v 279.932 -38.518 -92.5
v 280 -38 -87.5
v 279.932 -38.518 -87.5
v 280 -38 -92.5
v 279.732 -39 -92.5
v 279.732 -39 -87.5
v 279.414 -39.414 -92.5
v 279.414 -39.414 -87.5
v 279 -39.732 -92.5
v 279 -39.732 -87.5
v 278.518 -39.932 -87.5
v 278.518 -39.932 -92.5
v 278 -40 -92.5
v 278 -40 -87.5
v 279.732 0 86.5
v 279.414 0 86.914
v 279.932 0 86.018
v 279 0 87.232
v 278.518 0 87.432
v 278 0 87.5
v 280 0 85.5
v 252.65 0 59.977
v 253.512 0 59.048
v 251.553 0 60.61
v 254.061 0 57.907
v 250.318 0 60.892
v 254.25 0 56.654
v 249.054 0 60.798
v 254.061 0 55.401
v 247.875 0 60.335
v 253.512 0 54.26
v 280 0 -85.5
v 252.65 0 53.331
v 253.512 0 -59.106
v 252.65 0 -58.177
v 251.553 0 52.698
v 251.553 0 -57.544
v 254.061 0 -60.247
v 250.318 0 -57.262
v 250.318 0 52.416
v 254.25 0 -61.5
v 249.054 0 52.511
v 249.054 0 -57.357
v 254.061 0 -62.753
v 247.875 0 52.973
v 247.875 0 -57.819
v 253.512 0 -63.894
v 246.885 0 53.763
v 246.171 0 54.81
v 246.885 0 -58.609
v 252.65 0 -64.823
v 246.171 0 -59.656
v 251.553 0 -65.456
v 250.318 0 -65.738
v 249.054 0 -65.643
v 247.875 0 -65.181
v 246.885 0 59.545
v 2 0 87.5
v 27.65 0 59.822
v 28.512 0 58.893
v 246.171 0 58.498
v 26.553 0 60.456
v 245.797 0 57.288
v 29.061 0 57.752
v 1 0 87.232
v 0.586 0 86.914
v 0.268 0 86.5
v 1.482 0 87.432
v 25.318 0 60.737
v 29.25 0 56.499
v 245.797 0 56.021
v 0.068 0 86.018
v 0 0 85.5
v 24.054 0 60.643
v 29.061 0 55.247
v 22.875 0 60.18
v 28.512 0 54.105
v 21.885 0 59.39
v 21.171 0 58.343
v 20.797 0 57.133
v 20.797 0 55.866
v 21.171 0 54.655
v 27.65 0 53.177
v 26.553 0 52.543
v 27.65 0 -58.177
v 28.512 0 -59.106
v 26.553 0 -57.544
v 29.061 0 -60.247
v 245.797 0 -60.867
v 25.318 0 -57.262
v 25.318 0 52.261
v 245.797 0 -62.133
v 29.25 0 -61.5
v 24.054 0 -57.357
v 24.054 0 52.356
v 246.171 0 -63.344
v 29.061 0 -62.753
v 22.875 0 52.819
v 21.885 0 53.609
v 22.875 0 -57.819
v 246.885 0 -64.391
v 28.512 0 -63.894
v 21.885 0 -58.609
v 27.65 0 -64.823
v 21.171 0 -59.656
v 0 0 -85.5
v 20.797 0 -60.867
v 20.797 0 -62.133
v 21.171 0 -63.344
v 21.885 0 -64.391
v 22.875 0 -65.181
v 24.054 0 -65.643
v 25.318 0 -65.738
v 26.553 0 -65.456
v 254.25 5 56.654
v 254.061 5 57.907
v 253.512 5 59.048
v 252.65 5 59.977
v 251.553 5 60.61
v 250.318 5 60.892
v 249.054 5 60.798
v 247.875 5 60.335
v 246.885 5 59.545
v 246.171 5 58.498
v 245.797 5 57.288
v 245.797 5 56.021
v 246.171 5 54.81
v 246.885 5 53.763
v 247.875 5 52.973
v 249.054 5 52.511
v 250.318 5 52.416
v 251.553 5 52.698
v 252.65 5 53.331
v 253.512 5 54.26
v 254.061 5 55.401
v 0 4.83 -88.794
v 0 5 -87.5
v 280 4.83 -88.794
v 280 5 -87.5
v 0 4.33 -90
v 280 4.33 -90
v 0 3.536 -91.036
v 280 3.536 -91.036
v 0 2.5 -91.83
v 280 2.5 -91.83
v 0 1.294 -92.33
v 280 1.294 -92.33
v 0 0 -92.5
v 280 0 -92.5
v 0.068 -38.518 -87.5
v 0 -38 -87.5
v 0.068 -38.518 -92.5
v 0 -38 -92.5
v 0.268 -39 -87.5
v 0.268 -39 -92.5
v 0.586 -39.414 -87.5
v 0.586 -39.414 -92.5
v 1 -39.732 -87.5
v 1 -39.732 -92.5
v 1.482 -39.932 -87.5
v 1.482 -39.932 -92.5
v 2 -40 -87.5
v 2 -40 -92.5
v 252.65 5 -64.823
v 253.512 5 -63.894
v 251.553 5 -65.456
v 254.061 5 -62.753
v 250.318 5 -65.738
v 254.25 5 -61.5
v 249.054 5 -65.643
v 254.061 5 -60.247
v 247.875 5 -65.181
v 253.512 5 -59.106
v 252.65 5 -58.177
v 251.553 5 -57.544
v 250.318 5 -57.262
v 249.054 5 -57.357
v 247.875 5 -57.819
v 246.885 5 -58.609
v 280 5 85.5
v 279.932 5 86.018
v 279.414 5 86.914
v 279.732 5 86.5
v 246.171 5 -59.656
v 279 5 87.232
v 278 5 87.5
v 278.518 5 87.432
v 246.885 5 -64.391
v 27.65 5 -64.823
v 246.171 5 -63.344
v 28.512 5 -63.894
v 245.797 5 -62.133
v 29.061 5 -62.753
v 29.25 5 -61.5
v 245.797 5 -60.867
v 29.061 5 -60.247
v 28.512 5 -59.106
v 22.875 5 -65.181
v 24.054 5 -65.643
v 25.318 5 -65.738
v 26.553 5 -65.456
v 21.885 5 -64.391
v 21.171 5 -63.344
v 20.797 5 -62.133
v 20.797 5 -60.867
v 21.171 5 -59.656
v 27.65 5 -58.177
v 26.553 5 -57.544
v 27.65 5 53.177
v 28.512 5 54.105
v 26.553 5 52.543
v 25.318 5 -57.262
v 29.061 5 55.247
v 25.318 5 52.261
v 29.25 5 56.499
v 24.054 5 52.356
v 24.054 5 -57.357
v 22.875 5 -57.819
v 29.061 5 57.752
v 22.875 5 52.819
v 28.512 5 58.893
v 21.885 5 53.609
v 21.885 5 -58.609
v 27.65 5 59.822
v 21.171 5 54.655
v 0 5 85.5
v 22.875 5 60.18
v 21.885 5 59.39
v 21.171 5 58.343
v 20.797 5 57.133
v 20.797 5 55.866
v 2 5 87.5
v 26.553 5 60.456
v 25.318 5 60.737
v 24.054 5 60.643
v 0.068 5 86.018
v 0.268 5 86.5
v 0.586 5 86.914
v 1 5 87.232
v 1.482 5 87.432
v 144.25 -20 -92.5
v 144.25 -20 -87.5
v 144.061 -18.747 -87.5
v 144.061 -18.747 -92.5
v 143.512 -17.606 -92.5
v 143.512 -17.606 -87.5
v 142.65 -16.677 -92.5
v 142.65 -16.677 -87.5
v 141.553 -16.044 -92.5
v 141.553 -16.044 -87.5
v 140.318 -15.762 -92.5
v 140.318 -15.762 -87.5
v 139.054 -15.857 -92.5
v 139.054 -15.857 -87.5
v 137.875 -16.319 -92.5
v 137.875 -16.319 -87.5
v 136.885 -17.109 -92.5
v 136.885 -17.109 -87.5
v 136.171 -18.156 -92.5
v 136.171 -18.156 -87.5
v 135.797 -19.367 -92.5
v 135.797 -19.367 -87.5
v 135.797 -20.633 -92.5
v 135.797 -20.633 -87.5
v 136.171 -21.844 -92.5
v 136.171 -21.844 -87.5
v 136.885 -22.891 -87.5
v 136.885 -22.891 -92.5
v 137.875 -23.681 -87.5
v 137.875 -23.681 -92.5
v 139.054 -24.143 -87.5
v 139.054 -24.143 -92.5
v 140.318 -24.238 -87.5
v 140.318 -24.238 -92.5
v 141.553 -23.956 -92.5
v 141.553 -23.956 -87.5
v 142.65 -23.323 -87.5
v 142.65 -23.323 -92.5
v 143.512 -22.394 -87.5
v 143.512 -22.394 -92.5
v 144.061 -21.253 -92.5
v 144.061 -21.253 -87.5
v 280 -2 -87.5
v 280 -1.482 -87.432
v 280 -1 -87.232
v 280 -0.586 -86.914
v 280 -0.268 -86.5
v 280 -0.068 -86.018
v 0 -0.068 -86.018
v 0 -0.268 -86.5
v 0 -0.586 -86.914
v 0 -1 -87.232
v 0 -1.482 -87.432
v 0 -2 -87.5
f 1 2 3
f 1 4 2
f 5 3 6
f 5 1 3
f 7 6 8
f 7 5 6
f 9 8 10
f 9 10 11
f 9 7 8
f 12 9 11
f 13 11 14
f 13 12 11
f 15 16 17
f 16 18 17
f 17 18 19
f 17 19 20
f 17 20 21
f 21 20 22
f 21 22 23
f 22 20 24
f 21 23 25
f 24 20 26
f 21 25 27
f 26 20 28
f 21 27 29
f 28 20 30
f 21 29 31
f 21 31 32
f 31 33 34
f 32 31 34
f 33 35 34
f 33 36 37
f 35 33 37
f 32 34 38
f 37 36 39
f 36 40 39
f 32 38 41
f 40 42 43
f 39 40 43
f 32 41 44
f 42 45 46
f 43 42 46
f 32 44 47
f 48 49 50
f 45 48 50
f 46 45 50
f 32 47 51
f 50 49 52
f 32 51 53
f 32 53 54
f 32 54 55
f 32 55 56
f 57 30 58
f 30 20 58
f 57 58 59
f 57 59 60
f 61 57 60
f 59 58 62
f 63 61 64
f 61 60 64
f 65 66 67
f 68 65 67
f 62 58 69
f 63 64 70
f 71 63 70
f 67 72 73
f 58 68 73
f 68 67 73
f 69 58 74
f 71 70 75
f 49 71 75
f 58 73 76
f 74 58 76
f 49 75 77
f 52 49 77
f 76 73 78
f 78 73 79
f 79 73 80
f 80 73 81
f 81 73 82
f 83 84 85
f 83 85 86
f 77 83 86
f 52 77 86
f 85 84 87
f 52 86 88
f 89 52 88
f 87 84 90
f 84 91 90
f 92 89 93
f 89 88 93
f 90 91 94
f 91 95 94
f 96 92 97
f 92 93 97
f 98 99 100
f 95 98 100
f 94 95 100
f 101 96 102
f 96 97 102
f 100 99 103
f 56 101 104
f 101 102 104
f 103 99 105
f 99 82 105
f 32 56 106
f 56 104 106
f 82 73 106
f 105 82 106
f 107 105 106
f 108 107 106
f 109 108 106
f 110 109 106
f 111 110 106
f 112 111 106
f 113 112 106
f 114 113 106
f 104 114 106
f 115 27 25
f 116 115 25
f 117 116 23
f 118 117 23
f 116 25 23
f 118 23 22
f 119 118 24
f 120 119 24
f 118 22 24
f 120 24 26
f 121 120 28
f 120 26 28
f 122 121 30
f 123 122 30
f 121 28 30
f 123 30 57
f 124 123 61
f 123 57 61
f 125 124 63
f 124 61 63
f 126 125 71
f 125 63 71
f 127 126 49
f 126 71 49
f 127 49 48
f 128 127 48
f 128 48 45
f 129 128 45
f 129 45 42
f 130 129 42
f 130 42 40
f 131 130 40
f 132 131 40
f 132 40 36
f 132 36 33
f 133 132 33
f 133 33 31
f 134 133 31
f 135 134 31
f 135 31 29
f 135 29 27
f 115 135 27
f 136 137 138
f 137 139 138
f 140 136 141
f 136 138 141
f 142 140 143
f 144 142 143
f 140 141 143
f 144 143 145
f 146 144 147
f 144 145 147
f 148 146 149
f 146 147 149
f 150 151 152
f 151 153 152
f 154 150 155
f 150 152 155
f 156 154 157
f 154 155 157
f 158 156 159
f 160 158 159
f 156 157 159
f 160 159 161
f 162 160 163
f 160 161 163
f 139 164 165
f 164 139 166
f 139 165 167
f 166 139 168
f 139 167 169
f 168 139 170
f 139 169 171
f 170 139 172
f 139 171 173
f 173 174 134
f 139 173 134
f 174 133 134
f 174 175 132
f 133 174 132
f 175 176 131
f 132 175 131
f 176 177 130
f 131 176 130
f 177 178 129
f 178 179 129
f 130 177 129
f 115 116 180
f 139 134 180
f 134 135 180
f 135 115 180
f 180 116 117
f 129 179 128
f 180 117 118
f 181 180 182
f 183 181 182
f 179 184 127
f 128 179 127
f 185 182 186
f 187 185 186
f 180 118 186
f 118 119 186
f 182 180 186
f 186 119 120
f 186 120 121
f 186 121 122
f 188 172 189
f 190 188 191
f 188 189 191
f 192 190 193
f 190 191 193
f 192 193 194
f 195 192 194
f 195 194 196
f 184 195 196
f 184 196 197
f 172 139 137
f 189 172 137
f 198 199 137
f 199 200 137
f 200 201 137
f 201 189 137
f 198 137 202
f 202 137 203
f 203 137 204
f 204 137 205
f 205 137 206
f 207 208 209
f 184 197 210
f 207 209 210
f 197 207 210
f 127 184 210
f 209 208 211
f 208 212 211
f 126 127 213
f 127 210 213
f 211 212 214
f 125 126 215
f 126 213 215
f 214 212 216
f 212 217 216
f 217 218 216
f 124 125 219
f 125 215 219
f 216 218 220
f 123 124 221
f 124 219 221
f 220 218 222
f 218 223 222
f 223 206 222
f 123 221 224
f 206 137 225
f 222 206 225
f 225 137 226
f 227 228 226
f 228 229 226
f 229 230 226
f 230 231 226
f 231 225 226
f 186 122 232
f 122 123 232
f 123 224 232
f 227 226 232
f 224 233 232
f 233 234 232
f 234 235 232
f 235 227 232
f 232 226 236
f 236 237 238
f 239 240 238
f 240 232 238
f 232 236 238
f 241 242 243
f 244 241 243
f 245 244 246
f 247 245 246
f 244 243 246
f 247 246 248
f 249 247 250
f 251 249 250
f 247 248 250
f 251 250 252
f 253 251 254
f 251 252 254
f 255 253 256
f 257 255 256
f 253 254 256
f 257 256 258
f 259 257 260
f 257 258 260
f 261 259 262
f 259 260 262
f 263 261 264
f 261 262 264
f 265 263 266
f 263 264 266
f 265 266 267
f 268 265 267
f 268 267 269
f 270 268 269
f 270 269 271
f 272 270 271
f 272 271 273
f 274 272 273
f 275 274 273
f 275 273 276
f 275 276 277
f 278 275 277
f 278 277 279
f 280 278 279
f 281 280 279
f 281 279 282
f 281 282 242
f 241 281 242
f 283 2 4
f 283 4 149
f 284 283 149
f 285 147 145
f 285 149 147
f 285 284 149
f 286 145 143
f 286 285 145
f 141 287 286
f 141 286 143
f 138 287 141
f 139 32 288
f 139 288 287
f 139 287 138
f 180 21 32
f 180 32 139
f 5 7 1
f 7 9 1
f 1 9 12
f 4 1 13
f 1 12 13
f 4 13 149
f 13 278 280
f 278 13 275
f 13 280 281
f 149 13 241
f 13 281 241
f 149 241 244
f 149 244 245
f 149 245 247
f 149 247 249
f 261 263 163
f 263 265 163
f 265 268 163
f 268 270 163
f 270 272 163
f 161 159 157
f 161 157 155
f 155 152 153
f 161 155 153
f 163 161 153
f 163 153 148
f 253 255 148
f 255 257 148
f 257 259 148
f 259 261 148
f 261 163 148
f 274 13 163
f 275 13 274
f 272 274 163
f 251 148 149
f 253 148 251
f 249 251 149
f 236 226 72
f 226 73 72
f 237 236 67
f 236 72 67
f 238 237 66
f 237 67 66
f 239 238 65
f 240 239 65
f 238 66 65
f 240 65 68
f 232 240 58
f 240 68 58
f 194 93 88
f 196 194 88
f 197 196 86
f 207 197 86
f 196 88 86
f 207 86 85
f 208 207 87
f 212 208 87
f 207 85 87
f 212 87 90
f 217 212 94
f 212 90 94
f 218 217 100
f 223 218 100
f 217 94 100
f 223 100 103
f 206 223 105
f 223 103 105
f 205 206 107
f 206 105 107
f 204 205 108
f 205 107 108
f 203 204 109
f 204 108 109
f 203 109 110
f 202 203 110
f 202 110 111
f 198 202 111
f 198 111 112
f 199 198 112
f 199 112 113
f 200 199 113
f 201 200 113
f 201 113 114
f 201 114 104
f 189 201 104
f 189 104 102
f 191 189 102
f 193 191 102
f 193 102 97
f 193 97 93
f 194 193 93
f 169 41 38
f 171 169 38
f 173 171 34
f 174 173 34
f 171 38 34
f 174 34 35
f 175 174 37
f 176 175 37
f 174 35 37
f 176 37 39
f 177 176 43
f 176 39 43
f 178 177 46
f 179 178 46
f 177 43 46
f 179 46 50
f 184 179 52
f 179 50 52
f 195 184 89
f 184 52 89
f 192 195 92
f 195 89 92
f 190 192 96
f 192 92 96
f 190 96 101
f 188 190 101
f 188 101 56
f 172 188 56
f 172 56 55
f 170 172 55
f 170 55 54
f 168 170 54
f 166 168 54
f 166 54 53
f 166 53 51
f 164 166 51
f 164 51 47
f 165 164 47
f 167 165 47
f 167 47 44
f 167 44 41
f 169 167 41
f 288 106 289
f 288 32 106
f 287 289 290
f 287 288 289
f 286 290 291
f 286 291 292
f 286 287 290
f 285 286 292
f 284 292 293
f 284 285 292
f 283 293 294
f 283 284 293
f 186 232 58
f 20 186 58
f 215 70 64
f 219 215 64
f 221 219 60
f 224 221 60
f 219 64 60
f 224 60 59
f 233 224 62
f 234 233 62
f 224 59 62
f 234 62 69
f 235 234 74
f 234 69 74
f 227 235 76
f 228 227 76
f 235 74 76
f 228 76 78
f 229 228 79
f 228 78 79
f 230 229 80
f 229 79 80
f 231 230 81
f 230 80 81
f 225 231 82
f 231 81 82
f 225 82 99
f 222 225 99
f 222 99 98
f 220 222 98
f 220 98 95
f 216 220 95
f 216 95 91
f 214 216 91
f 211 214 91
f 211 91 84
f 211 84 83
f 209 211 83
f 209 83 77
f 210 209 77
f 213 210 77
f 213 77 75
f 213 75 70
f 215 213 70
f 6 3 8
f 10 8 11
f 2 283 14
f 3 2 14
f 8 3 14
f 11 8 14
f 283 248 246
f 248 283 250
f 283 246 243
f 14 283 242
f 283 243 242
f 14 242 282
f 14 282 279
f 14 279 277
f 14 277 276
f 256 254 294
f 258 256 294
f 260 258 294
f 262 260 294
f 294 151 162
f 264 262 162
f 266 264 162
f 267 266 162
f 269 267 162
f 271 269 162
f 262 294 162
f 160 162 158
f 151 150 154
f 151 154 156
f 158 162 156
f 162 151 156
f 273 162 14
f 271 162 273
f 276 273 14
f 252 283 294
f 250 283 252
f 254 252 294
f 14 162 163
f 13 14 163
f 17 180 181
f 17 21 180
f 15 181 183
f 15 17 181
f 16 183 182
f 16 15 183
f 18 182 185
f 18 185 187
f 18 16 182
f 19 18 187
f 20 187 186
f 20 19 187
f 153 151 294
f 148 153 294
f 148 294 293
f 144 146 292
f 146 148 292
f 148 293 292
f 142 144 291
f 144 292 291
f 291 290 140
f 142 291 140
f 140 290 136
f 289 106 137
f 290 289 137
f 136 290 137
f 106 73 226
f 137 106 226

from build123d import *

# Parameters (mm, degrees)
F1_DEPTH = 280
F2_R     = 4.25
F3_DEPTH = 5.001
F4_R     = 2
F5_R     = 5
F6_R     = 4.25
F7_DEPTH = 5.001


with BuildPart() as f1:
    # F0 (on Right) → F1 (new body)
    with BuildSketch(Plane.YZ):
        Polygon((5, -92.5), (5, 87.5), (0, 87.5), (0, -87.5), (-40, -87.5), (-40, -92.5), align=None)
    extrude(amount=F1_DEPTH)

    # F2 (on face) → F3 (cut, through all)
    with BuildSketch(Plane.XZ):
        with Locations((25, 56.499322)):
            Circle(F2_R)
        with Locations((250, 56.654073)):
            Circle(F2_R)
        with Locations((250, -61.5)):
            Circle(F2_R)
        with Locations((25, -61.5)):
            Circle(F2_R)
    extrude(amount=-F3_DEPTH, mode=Mode.SUBTRACT)

    # F4
    f4_edges = [f1.edges().sort_by_distance(p)[0] for p in [
        (280, 2.5, 87.5),
        (0, 2.5, 87.5),
        (0, -40, -90),
        (280, -40, -90),
        (140, 0, -87.5),
    ]]
    fillet(f4_edges, radius=F4_R)

    # F5
    f5_edges = [f1.edges().sort_by_distance(p)[0] for p in [
        (140, 5, -92.5),
    ]]
    fillet(f5_edges, radius=F5_R)

    # F6 (on face) → F7 (cut, through all)
    with BuildSketch(Plane.XY.offset(-87.5)):
        with Locations((140, -20)):
            Circle(F6_R)
    extrude(amount=-F7_DEPTH, mode=Mode.SUBTRACT)


solid = f1.part
